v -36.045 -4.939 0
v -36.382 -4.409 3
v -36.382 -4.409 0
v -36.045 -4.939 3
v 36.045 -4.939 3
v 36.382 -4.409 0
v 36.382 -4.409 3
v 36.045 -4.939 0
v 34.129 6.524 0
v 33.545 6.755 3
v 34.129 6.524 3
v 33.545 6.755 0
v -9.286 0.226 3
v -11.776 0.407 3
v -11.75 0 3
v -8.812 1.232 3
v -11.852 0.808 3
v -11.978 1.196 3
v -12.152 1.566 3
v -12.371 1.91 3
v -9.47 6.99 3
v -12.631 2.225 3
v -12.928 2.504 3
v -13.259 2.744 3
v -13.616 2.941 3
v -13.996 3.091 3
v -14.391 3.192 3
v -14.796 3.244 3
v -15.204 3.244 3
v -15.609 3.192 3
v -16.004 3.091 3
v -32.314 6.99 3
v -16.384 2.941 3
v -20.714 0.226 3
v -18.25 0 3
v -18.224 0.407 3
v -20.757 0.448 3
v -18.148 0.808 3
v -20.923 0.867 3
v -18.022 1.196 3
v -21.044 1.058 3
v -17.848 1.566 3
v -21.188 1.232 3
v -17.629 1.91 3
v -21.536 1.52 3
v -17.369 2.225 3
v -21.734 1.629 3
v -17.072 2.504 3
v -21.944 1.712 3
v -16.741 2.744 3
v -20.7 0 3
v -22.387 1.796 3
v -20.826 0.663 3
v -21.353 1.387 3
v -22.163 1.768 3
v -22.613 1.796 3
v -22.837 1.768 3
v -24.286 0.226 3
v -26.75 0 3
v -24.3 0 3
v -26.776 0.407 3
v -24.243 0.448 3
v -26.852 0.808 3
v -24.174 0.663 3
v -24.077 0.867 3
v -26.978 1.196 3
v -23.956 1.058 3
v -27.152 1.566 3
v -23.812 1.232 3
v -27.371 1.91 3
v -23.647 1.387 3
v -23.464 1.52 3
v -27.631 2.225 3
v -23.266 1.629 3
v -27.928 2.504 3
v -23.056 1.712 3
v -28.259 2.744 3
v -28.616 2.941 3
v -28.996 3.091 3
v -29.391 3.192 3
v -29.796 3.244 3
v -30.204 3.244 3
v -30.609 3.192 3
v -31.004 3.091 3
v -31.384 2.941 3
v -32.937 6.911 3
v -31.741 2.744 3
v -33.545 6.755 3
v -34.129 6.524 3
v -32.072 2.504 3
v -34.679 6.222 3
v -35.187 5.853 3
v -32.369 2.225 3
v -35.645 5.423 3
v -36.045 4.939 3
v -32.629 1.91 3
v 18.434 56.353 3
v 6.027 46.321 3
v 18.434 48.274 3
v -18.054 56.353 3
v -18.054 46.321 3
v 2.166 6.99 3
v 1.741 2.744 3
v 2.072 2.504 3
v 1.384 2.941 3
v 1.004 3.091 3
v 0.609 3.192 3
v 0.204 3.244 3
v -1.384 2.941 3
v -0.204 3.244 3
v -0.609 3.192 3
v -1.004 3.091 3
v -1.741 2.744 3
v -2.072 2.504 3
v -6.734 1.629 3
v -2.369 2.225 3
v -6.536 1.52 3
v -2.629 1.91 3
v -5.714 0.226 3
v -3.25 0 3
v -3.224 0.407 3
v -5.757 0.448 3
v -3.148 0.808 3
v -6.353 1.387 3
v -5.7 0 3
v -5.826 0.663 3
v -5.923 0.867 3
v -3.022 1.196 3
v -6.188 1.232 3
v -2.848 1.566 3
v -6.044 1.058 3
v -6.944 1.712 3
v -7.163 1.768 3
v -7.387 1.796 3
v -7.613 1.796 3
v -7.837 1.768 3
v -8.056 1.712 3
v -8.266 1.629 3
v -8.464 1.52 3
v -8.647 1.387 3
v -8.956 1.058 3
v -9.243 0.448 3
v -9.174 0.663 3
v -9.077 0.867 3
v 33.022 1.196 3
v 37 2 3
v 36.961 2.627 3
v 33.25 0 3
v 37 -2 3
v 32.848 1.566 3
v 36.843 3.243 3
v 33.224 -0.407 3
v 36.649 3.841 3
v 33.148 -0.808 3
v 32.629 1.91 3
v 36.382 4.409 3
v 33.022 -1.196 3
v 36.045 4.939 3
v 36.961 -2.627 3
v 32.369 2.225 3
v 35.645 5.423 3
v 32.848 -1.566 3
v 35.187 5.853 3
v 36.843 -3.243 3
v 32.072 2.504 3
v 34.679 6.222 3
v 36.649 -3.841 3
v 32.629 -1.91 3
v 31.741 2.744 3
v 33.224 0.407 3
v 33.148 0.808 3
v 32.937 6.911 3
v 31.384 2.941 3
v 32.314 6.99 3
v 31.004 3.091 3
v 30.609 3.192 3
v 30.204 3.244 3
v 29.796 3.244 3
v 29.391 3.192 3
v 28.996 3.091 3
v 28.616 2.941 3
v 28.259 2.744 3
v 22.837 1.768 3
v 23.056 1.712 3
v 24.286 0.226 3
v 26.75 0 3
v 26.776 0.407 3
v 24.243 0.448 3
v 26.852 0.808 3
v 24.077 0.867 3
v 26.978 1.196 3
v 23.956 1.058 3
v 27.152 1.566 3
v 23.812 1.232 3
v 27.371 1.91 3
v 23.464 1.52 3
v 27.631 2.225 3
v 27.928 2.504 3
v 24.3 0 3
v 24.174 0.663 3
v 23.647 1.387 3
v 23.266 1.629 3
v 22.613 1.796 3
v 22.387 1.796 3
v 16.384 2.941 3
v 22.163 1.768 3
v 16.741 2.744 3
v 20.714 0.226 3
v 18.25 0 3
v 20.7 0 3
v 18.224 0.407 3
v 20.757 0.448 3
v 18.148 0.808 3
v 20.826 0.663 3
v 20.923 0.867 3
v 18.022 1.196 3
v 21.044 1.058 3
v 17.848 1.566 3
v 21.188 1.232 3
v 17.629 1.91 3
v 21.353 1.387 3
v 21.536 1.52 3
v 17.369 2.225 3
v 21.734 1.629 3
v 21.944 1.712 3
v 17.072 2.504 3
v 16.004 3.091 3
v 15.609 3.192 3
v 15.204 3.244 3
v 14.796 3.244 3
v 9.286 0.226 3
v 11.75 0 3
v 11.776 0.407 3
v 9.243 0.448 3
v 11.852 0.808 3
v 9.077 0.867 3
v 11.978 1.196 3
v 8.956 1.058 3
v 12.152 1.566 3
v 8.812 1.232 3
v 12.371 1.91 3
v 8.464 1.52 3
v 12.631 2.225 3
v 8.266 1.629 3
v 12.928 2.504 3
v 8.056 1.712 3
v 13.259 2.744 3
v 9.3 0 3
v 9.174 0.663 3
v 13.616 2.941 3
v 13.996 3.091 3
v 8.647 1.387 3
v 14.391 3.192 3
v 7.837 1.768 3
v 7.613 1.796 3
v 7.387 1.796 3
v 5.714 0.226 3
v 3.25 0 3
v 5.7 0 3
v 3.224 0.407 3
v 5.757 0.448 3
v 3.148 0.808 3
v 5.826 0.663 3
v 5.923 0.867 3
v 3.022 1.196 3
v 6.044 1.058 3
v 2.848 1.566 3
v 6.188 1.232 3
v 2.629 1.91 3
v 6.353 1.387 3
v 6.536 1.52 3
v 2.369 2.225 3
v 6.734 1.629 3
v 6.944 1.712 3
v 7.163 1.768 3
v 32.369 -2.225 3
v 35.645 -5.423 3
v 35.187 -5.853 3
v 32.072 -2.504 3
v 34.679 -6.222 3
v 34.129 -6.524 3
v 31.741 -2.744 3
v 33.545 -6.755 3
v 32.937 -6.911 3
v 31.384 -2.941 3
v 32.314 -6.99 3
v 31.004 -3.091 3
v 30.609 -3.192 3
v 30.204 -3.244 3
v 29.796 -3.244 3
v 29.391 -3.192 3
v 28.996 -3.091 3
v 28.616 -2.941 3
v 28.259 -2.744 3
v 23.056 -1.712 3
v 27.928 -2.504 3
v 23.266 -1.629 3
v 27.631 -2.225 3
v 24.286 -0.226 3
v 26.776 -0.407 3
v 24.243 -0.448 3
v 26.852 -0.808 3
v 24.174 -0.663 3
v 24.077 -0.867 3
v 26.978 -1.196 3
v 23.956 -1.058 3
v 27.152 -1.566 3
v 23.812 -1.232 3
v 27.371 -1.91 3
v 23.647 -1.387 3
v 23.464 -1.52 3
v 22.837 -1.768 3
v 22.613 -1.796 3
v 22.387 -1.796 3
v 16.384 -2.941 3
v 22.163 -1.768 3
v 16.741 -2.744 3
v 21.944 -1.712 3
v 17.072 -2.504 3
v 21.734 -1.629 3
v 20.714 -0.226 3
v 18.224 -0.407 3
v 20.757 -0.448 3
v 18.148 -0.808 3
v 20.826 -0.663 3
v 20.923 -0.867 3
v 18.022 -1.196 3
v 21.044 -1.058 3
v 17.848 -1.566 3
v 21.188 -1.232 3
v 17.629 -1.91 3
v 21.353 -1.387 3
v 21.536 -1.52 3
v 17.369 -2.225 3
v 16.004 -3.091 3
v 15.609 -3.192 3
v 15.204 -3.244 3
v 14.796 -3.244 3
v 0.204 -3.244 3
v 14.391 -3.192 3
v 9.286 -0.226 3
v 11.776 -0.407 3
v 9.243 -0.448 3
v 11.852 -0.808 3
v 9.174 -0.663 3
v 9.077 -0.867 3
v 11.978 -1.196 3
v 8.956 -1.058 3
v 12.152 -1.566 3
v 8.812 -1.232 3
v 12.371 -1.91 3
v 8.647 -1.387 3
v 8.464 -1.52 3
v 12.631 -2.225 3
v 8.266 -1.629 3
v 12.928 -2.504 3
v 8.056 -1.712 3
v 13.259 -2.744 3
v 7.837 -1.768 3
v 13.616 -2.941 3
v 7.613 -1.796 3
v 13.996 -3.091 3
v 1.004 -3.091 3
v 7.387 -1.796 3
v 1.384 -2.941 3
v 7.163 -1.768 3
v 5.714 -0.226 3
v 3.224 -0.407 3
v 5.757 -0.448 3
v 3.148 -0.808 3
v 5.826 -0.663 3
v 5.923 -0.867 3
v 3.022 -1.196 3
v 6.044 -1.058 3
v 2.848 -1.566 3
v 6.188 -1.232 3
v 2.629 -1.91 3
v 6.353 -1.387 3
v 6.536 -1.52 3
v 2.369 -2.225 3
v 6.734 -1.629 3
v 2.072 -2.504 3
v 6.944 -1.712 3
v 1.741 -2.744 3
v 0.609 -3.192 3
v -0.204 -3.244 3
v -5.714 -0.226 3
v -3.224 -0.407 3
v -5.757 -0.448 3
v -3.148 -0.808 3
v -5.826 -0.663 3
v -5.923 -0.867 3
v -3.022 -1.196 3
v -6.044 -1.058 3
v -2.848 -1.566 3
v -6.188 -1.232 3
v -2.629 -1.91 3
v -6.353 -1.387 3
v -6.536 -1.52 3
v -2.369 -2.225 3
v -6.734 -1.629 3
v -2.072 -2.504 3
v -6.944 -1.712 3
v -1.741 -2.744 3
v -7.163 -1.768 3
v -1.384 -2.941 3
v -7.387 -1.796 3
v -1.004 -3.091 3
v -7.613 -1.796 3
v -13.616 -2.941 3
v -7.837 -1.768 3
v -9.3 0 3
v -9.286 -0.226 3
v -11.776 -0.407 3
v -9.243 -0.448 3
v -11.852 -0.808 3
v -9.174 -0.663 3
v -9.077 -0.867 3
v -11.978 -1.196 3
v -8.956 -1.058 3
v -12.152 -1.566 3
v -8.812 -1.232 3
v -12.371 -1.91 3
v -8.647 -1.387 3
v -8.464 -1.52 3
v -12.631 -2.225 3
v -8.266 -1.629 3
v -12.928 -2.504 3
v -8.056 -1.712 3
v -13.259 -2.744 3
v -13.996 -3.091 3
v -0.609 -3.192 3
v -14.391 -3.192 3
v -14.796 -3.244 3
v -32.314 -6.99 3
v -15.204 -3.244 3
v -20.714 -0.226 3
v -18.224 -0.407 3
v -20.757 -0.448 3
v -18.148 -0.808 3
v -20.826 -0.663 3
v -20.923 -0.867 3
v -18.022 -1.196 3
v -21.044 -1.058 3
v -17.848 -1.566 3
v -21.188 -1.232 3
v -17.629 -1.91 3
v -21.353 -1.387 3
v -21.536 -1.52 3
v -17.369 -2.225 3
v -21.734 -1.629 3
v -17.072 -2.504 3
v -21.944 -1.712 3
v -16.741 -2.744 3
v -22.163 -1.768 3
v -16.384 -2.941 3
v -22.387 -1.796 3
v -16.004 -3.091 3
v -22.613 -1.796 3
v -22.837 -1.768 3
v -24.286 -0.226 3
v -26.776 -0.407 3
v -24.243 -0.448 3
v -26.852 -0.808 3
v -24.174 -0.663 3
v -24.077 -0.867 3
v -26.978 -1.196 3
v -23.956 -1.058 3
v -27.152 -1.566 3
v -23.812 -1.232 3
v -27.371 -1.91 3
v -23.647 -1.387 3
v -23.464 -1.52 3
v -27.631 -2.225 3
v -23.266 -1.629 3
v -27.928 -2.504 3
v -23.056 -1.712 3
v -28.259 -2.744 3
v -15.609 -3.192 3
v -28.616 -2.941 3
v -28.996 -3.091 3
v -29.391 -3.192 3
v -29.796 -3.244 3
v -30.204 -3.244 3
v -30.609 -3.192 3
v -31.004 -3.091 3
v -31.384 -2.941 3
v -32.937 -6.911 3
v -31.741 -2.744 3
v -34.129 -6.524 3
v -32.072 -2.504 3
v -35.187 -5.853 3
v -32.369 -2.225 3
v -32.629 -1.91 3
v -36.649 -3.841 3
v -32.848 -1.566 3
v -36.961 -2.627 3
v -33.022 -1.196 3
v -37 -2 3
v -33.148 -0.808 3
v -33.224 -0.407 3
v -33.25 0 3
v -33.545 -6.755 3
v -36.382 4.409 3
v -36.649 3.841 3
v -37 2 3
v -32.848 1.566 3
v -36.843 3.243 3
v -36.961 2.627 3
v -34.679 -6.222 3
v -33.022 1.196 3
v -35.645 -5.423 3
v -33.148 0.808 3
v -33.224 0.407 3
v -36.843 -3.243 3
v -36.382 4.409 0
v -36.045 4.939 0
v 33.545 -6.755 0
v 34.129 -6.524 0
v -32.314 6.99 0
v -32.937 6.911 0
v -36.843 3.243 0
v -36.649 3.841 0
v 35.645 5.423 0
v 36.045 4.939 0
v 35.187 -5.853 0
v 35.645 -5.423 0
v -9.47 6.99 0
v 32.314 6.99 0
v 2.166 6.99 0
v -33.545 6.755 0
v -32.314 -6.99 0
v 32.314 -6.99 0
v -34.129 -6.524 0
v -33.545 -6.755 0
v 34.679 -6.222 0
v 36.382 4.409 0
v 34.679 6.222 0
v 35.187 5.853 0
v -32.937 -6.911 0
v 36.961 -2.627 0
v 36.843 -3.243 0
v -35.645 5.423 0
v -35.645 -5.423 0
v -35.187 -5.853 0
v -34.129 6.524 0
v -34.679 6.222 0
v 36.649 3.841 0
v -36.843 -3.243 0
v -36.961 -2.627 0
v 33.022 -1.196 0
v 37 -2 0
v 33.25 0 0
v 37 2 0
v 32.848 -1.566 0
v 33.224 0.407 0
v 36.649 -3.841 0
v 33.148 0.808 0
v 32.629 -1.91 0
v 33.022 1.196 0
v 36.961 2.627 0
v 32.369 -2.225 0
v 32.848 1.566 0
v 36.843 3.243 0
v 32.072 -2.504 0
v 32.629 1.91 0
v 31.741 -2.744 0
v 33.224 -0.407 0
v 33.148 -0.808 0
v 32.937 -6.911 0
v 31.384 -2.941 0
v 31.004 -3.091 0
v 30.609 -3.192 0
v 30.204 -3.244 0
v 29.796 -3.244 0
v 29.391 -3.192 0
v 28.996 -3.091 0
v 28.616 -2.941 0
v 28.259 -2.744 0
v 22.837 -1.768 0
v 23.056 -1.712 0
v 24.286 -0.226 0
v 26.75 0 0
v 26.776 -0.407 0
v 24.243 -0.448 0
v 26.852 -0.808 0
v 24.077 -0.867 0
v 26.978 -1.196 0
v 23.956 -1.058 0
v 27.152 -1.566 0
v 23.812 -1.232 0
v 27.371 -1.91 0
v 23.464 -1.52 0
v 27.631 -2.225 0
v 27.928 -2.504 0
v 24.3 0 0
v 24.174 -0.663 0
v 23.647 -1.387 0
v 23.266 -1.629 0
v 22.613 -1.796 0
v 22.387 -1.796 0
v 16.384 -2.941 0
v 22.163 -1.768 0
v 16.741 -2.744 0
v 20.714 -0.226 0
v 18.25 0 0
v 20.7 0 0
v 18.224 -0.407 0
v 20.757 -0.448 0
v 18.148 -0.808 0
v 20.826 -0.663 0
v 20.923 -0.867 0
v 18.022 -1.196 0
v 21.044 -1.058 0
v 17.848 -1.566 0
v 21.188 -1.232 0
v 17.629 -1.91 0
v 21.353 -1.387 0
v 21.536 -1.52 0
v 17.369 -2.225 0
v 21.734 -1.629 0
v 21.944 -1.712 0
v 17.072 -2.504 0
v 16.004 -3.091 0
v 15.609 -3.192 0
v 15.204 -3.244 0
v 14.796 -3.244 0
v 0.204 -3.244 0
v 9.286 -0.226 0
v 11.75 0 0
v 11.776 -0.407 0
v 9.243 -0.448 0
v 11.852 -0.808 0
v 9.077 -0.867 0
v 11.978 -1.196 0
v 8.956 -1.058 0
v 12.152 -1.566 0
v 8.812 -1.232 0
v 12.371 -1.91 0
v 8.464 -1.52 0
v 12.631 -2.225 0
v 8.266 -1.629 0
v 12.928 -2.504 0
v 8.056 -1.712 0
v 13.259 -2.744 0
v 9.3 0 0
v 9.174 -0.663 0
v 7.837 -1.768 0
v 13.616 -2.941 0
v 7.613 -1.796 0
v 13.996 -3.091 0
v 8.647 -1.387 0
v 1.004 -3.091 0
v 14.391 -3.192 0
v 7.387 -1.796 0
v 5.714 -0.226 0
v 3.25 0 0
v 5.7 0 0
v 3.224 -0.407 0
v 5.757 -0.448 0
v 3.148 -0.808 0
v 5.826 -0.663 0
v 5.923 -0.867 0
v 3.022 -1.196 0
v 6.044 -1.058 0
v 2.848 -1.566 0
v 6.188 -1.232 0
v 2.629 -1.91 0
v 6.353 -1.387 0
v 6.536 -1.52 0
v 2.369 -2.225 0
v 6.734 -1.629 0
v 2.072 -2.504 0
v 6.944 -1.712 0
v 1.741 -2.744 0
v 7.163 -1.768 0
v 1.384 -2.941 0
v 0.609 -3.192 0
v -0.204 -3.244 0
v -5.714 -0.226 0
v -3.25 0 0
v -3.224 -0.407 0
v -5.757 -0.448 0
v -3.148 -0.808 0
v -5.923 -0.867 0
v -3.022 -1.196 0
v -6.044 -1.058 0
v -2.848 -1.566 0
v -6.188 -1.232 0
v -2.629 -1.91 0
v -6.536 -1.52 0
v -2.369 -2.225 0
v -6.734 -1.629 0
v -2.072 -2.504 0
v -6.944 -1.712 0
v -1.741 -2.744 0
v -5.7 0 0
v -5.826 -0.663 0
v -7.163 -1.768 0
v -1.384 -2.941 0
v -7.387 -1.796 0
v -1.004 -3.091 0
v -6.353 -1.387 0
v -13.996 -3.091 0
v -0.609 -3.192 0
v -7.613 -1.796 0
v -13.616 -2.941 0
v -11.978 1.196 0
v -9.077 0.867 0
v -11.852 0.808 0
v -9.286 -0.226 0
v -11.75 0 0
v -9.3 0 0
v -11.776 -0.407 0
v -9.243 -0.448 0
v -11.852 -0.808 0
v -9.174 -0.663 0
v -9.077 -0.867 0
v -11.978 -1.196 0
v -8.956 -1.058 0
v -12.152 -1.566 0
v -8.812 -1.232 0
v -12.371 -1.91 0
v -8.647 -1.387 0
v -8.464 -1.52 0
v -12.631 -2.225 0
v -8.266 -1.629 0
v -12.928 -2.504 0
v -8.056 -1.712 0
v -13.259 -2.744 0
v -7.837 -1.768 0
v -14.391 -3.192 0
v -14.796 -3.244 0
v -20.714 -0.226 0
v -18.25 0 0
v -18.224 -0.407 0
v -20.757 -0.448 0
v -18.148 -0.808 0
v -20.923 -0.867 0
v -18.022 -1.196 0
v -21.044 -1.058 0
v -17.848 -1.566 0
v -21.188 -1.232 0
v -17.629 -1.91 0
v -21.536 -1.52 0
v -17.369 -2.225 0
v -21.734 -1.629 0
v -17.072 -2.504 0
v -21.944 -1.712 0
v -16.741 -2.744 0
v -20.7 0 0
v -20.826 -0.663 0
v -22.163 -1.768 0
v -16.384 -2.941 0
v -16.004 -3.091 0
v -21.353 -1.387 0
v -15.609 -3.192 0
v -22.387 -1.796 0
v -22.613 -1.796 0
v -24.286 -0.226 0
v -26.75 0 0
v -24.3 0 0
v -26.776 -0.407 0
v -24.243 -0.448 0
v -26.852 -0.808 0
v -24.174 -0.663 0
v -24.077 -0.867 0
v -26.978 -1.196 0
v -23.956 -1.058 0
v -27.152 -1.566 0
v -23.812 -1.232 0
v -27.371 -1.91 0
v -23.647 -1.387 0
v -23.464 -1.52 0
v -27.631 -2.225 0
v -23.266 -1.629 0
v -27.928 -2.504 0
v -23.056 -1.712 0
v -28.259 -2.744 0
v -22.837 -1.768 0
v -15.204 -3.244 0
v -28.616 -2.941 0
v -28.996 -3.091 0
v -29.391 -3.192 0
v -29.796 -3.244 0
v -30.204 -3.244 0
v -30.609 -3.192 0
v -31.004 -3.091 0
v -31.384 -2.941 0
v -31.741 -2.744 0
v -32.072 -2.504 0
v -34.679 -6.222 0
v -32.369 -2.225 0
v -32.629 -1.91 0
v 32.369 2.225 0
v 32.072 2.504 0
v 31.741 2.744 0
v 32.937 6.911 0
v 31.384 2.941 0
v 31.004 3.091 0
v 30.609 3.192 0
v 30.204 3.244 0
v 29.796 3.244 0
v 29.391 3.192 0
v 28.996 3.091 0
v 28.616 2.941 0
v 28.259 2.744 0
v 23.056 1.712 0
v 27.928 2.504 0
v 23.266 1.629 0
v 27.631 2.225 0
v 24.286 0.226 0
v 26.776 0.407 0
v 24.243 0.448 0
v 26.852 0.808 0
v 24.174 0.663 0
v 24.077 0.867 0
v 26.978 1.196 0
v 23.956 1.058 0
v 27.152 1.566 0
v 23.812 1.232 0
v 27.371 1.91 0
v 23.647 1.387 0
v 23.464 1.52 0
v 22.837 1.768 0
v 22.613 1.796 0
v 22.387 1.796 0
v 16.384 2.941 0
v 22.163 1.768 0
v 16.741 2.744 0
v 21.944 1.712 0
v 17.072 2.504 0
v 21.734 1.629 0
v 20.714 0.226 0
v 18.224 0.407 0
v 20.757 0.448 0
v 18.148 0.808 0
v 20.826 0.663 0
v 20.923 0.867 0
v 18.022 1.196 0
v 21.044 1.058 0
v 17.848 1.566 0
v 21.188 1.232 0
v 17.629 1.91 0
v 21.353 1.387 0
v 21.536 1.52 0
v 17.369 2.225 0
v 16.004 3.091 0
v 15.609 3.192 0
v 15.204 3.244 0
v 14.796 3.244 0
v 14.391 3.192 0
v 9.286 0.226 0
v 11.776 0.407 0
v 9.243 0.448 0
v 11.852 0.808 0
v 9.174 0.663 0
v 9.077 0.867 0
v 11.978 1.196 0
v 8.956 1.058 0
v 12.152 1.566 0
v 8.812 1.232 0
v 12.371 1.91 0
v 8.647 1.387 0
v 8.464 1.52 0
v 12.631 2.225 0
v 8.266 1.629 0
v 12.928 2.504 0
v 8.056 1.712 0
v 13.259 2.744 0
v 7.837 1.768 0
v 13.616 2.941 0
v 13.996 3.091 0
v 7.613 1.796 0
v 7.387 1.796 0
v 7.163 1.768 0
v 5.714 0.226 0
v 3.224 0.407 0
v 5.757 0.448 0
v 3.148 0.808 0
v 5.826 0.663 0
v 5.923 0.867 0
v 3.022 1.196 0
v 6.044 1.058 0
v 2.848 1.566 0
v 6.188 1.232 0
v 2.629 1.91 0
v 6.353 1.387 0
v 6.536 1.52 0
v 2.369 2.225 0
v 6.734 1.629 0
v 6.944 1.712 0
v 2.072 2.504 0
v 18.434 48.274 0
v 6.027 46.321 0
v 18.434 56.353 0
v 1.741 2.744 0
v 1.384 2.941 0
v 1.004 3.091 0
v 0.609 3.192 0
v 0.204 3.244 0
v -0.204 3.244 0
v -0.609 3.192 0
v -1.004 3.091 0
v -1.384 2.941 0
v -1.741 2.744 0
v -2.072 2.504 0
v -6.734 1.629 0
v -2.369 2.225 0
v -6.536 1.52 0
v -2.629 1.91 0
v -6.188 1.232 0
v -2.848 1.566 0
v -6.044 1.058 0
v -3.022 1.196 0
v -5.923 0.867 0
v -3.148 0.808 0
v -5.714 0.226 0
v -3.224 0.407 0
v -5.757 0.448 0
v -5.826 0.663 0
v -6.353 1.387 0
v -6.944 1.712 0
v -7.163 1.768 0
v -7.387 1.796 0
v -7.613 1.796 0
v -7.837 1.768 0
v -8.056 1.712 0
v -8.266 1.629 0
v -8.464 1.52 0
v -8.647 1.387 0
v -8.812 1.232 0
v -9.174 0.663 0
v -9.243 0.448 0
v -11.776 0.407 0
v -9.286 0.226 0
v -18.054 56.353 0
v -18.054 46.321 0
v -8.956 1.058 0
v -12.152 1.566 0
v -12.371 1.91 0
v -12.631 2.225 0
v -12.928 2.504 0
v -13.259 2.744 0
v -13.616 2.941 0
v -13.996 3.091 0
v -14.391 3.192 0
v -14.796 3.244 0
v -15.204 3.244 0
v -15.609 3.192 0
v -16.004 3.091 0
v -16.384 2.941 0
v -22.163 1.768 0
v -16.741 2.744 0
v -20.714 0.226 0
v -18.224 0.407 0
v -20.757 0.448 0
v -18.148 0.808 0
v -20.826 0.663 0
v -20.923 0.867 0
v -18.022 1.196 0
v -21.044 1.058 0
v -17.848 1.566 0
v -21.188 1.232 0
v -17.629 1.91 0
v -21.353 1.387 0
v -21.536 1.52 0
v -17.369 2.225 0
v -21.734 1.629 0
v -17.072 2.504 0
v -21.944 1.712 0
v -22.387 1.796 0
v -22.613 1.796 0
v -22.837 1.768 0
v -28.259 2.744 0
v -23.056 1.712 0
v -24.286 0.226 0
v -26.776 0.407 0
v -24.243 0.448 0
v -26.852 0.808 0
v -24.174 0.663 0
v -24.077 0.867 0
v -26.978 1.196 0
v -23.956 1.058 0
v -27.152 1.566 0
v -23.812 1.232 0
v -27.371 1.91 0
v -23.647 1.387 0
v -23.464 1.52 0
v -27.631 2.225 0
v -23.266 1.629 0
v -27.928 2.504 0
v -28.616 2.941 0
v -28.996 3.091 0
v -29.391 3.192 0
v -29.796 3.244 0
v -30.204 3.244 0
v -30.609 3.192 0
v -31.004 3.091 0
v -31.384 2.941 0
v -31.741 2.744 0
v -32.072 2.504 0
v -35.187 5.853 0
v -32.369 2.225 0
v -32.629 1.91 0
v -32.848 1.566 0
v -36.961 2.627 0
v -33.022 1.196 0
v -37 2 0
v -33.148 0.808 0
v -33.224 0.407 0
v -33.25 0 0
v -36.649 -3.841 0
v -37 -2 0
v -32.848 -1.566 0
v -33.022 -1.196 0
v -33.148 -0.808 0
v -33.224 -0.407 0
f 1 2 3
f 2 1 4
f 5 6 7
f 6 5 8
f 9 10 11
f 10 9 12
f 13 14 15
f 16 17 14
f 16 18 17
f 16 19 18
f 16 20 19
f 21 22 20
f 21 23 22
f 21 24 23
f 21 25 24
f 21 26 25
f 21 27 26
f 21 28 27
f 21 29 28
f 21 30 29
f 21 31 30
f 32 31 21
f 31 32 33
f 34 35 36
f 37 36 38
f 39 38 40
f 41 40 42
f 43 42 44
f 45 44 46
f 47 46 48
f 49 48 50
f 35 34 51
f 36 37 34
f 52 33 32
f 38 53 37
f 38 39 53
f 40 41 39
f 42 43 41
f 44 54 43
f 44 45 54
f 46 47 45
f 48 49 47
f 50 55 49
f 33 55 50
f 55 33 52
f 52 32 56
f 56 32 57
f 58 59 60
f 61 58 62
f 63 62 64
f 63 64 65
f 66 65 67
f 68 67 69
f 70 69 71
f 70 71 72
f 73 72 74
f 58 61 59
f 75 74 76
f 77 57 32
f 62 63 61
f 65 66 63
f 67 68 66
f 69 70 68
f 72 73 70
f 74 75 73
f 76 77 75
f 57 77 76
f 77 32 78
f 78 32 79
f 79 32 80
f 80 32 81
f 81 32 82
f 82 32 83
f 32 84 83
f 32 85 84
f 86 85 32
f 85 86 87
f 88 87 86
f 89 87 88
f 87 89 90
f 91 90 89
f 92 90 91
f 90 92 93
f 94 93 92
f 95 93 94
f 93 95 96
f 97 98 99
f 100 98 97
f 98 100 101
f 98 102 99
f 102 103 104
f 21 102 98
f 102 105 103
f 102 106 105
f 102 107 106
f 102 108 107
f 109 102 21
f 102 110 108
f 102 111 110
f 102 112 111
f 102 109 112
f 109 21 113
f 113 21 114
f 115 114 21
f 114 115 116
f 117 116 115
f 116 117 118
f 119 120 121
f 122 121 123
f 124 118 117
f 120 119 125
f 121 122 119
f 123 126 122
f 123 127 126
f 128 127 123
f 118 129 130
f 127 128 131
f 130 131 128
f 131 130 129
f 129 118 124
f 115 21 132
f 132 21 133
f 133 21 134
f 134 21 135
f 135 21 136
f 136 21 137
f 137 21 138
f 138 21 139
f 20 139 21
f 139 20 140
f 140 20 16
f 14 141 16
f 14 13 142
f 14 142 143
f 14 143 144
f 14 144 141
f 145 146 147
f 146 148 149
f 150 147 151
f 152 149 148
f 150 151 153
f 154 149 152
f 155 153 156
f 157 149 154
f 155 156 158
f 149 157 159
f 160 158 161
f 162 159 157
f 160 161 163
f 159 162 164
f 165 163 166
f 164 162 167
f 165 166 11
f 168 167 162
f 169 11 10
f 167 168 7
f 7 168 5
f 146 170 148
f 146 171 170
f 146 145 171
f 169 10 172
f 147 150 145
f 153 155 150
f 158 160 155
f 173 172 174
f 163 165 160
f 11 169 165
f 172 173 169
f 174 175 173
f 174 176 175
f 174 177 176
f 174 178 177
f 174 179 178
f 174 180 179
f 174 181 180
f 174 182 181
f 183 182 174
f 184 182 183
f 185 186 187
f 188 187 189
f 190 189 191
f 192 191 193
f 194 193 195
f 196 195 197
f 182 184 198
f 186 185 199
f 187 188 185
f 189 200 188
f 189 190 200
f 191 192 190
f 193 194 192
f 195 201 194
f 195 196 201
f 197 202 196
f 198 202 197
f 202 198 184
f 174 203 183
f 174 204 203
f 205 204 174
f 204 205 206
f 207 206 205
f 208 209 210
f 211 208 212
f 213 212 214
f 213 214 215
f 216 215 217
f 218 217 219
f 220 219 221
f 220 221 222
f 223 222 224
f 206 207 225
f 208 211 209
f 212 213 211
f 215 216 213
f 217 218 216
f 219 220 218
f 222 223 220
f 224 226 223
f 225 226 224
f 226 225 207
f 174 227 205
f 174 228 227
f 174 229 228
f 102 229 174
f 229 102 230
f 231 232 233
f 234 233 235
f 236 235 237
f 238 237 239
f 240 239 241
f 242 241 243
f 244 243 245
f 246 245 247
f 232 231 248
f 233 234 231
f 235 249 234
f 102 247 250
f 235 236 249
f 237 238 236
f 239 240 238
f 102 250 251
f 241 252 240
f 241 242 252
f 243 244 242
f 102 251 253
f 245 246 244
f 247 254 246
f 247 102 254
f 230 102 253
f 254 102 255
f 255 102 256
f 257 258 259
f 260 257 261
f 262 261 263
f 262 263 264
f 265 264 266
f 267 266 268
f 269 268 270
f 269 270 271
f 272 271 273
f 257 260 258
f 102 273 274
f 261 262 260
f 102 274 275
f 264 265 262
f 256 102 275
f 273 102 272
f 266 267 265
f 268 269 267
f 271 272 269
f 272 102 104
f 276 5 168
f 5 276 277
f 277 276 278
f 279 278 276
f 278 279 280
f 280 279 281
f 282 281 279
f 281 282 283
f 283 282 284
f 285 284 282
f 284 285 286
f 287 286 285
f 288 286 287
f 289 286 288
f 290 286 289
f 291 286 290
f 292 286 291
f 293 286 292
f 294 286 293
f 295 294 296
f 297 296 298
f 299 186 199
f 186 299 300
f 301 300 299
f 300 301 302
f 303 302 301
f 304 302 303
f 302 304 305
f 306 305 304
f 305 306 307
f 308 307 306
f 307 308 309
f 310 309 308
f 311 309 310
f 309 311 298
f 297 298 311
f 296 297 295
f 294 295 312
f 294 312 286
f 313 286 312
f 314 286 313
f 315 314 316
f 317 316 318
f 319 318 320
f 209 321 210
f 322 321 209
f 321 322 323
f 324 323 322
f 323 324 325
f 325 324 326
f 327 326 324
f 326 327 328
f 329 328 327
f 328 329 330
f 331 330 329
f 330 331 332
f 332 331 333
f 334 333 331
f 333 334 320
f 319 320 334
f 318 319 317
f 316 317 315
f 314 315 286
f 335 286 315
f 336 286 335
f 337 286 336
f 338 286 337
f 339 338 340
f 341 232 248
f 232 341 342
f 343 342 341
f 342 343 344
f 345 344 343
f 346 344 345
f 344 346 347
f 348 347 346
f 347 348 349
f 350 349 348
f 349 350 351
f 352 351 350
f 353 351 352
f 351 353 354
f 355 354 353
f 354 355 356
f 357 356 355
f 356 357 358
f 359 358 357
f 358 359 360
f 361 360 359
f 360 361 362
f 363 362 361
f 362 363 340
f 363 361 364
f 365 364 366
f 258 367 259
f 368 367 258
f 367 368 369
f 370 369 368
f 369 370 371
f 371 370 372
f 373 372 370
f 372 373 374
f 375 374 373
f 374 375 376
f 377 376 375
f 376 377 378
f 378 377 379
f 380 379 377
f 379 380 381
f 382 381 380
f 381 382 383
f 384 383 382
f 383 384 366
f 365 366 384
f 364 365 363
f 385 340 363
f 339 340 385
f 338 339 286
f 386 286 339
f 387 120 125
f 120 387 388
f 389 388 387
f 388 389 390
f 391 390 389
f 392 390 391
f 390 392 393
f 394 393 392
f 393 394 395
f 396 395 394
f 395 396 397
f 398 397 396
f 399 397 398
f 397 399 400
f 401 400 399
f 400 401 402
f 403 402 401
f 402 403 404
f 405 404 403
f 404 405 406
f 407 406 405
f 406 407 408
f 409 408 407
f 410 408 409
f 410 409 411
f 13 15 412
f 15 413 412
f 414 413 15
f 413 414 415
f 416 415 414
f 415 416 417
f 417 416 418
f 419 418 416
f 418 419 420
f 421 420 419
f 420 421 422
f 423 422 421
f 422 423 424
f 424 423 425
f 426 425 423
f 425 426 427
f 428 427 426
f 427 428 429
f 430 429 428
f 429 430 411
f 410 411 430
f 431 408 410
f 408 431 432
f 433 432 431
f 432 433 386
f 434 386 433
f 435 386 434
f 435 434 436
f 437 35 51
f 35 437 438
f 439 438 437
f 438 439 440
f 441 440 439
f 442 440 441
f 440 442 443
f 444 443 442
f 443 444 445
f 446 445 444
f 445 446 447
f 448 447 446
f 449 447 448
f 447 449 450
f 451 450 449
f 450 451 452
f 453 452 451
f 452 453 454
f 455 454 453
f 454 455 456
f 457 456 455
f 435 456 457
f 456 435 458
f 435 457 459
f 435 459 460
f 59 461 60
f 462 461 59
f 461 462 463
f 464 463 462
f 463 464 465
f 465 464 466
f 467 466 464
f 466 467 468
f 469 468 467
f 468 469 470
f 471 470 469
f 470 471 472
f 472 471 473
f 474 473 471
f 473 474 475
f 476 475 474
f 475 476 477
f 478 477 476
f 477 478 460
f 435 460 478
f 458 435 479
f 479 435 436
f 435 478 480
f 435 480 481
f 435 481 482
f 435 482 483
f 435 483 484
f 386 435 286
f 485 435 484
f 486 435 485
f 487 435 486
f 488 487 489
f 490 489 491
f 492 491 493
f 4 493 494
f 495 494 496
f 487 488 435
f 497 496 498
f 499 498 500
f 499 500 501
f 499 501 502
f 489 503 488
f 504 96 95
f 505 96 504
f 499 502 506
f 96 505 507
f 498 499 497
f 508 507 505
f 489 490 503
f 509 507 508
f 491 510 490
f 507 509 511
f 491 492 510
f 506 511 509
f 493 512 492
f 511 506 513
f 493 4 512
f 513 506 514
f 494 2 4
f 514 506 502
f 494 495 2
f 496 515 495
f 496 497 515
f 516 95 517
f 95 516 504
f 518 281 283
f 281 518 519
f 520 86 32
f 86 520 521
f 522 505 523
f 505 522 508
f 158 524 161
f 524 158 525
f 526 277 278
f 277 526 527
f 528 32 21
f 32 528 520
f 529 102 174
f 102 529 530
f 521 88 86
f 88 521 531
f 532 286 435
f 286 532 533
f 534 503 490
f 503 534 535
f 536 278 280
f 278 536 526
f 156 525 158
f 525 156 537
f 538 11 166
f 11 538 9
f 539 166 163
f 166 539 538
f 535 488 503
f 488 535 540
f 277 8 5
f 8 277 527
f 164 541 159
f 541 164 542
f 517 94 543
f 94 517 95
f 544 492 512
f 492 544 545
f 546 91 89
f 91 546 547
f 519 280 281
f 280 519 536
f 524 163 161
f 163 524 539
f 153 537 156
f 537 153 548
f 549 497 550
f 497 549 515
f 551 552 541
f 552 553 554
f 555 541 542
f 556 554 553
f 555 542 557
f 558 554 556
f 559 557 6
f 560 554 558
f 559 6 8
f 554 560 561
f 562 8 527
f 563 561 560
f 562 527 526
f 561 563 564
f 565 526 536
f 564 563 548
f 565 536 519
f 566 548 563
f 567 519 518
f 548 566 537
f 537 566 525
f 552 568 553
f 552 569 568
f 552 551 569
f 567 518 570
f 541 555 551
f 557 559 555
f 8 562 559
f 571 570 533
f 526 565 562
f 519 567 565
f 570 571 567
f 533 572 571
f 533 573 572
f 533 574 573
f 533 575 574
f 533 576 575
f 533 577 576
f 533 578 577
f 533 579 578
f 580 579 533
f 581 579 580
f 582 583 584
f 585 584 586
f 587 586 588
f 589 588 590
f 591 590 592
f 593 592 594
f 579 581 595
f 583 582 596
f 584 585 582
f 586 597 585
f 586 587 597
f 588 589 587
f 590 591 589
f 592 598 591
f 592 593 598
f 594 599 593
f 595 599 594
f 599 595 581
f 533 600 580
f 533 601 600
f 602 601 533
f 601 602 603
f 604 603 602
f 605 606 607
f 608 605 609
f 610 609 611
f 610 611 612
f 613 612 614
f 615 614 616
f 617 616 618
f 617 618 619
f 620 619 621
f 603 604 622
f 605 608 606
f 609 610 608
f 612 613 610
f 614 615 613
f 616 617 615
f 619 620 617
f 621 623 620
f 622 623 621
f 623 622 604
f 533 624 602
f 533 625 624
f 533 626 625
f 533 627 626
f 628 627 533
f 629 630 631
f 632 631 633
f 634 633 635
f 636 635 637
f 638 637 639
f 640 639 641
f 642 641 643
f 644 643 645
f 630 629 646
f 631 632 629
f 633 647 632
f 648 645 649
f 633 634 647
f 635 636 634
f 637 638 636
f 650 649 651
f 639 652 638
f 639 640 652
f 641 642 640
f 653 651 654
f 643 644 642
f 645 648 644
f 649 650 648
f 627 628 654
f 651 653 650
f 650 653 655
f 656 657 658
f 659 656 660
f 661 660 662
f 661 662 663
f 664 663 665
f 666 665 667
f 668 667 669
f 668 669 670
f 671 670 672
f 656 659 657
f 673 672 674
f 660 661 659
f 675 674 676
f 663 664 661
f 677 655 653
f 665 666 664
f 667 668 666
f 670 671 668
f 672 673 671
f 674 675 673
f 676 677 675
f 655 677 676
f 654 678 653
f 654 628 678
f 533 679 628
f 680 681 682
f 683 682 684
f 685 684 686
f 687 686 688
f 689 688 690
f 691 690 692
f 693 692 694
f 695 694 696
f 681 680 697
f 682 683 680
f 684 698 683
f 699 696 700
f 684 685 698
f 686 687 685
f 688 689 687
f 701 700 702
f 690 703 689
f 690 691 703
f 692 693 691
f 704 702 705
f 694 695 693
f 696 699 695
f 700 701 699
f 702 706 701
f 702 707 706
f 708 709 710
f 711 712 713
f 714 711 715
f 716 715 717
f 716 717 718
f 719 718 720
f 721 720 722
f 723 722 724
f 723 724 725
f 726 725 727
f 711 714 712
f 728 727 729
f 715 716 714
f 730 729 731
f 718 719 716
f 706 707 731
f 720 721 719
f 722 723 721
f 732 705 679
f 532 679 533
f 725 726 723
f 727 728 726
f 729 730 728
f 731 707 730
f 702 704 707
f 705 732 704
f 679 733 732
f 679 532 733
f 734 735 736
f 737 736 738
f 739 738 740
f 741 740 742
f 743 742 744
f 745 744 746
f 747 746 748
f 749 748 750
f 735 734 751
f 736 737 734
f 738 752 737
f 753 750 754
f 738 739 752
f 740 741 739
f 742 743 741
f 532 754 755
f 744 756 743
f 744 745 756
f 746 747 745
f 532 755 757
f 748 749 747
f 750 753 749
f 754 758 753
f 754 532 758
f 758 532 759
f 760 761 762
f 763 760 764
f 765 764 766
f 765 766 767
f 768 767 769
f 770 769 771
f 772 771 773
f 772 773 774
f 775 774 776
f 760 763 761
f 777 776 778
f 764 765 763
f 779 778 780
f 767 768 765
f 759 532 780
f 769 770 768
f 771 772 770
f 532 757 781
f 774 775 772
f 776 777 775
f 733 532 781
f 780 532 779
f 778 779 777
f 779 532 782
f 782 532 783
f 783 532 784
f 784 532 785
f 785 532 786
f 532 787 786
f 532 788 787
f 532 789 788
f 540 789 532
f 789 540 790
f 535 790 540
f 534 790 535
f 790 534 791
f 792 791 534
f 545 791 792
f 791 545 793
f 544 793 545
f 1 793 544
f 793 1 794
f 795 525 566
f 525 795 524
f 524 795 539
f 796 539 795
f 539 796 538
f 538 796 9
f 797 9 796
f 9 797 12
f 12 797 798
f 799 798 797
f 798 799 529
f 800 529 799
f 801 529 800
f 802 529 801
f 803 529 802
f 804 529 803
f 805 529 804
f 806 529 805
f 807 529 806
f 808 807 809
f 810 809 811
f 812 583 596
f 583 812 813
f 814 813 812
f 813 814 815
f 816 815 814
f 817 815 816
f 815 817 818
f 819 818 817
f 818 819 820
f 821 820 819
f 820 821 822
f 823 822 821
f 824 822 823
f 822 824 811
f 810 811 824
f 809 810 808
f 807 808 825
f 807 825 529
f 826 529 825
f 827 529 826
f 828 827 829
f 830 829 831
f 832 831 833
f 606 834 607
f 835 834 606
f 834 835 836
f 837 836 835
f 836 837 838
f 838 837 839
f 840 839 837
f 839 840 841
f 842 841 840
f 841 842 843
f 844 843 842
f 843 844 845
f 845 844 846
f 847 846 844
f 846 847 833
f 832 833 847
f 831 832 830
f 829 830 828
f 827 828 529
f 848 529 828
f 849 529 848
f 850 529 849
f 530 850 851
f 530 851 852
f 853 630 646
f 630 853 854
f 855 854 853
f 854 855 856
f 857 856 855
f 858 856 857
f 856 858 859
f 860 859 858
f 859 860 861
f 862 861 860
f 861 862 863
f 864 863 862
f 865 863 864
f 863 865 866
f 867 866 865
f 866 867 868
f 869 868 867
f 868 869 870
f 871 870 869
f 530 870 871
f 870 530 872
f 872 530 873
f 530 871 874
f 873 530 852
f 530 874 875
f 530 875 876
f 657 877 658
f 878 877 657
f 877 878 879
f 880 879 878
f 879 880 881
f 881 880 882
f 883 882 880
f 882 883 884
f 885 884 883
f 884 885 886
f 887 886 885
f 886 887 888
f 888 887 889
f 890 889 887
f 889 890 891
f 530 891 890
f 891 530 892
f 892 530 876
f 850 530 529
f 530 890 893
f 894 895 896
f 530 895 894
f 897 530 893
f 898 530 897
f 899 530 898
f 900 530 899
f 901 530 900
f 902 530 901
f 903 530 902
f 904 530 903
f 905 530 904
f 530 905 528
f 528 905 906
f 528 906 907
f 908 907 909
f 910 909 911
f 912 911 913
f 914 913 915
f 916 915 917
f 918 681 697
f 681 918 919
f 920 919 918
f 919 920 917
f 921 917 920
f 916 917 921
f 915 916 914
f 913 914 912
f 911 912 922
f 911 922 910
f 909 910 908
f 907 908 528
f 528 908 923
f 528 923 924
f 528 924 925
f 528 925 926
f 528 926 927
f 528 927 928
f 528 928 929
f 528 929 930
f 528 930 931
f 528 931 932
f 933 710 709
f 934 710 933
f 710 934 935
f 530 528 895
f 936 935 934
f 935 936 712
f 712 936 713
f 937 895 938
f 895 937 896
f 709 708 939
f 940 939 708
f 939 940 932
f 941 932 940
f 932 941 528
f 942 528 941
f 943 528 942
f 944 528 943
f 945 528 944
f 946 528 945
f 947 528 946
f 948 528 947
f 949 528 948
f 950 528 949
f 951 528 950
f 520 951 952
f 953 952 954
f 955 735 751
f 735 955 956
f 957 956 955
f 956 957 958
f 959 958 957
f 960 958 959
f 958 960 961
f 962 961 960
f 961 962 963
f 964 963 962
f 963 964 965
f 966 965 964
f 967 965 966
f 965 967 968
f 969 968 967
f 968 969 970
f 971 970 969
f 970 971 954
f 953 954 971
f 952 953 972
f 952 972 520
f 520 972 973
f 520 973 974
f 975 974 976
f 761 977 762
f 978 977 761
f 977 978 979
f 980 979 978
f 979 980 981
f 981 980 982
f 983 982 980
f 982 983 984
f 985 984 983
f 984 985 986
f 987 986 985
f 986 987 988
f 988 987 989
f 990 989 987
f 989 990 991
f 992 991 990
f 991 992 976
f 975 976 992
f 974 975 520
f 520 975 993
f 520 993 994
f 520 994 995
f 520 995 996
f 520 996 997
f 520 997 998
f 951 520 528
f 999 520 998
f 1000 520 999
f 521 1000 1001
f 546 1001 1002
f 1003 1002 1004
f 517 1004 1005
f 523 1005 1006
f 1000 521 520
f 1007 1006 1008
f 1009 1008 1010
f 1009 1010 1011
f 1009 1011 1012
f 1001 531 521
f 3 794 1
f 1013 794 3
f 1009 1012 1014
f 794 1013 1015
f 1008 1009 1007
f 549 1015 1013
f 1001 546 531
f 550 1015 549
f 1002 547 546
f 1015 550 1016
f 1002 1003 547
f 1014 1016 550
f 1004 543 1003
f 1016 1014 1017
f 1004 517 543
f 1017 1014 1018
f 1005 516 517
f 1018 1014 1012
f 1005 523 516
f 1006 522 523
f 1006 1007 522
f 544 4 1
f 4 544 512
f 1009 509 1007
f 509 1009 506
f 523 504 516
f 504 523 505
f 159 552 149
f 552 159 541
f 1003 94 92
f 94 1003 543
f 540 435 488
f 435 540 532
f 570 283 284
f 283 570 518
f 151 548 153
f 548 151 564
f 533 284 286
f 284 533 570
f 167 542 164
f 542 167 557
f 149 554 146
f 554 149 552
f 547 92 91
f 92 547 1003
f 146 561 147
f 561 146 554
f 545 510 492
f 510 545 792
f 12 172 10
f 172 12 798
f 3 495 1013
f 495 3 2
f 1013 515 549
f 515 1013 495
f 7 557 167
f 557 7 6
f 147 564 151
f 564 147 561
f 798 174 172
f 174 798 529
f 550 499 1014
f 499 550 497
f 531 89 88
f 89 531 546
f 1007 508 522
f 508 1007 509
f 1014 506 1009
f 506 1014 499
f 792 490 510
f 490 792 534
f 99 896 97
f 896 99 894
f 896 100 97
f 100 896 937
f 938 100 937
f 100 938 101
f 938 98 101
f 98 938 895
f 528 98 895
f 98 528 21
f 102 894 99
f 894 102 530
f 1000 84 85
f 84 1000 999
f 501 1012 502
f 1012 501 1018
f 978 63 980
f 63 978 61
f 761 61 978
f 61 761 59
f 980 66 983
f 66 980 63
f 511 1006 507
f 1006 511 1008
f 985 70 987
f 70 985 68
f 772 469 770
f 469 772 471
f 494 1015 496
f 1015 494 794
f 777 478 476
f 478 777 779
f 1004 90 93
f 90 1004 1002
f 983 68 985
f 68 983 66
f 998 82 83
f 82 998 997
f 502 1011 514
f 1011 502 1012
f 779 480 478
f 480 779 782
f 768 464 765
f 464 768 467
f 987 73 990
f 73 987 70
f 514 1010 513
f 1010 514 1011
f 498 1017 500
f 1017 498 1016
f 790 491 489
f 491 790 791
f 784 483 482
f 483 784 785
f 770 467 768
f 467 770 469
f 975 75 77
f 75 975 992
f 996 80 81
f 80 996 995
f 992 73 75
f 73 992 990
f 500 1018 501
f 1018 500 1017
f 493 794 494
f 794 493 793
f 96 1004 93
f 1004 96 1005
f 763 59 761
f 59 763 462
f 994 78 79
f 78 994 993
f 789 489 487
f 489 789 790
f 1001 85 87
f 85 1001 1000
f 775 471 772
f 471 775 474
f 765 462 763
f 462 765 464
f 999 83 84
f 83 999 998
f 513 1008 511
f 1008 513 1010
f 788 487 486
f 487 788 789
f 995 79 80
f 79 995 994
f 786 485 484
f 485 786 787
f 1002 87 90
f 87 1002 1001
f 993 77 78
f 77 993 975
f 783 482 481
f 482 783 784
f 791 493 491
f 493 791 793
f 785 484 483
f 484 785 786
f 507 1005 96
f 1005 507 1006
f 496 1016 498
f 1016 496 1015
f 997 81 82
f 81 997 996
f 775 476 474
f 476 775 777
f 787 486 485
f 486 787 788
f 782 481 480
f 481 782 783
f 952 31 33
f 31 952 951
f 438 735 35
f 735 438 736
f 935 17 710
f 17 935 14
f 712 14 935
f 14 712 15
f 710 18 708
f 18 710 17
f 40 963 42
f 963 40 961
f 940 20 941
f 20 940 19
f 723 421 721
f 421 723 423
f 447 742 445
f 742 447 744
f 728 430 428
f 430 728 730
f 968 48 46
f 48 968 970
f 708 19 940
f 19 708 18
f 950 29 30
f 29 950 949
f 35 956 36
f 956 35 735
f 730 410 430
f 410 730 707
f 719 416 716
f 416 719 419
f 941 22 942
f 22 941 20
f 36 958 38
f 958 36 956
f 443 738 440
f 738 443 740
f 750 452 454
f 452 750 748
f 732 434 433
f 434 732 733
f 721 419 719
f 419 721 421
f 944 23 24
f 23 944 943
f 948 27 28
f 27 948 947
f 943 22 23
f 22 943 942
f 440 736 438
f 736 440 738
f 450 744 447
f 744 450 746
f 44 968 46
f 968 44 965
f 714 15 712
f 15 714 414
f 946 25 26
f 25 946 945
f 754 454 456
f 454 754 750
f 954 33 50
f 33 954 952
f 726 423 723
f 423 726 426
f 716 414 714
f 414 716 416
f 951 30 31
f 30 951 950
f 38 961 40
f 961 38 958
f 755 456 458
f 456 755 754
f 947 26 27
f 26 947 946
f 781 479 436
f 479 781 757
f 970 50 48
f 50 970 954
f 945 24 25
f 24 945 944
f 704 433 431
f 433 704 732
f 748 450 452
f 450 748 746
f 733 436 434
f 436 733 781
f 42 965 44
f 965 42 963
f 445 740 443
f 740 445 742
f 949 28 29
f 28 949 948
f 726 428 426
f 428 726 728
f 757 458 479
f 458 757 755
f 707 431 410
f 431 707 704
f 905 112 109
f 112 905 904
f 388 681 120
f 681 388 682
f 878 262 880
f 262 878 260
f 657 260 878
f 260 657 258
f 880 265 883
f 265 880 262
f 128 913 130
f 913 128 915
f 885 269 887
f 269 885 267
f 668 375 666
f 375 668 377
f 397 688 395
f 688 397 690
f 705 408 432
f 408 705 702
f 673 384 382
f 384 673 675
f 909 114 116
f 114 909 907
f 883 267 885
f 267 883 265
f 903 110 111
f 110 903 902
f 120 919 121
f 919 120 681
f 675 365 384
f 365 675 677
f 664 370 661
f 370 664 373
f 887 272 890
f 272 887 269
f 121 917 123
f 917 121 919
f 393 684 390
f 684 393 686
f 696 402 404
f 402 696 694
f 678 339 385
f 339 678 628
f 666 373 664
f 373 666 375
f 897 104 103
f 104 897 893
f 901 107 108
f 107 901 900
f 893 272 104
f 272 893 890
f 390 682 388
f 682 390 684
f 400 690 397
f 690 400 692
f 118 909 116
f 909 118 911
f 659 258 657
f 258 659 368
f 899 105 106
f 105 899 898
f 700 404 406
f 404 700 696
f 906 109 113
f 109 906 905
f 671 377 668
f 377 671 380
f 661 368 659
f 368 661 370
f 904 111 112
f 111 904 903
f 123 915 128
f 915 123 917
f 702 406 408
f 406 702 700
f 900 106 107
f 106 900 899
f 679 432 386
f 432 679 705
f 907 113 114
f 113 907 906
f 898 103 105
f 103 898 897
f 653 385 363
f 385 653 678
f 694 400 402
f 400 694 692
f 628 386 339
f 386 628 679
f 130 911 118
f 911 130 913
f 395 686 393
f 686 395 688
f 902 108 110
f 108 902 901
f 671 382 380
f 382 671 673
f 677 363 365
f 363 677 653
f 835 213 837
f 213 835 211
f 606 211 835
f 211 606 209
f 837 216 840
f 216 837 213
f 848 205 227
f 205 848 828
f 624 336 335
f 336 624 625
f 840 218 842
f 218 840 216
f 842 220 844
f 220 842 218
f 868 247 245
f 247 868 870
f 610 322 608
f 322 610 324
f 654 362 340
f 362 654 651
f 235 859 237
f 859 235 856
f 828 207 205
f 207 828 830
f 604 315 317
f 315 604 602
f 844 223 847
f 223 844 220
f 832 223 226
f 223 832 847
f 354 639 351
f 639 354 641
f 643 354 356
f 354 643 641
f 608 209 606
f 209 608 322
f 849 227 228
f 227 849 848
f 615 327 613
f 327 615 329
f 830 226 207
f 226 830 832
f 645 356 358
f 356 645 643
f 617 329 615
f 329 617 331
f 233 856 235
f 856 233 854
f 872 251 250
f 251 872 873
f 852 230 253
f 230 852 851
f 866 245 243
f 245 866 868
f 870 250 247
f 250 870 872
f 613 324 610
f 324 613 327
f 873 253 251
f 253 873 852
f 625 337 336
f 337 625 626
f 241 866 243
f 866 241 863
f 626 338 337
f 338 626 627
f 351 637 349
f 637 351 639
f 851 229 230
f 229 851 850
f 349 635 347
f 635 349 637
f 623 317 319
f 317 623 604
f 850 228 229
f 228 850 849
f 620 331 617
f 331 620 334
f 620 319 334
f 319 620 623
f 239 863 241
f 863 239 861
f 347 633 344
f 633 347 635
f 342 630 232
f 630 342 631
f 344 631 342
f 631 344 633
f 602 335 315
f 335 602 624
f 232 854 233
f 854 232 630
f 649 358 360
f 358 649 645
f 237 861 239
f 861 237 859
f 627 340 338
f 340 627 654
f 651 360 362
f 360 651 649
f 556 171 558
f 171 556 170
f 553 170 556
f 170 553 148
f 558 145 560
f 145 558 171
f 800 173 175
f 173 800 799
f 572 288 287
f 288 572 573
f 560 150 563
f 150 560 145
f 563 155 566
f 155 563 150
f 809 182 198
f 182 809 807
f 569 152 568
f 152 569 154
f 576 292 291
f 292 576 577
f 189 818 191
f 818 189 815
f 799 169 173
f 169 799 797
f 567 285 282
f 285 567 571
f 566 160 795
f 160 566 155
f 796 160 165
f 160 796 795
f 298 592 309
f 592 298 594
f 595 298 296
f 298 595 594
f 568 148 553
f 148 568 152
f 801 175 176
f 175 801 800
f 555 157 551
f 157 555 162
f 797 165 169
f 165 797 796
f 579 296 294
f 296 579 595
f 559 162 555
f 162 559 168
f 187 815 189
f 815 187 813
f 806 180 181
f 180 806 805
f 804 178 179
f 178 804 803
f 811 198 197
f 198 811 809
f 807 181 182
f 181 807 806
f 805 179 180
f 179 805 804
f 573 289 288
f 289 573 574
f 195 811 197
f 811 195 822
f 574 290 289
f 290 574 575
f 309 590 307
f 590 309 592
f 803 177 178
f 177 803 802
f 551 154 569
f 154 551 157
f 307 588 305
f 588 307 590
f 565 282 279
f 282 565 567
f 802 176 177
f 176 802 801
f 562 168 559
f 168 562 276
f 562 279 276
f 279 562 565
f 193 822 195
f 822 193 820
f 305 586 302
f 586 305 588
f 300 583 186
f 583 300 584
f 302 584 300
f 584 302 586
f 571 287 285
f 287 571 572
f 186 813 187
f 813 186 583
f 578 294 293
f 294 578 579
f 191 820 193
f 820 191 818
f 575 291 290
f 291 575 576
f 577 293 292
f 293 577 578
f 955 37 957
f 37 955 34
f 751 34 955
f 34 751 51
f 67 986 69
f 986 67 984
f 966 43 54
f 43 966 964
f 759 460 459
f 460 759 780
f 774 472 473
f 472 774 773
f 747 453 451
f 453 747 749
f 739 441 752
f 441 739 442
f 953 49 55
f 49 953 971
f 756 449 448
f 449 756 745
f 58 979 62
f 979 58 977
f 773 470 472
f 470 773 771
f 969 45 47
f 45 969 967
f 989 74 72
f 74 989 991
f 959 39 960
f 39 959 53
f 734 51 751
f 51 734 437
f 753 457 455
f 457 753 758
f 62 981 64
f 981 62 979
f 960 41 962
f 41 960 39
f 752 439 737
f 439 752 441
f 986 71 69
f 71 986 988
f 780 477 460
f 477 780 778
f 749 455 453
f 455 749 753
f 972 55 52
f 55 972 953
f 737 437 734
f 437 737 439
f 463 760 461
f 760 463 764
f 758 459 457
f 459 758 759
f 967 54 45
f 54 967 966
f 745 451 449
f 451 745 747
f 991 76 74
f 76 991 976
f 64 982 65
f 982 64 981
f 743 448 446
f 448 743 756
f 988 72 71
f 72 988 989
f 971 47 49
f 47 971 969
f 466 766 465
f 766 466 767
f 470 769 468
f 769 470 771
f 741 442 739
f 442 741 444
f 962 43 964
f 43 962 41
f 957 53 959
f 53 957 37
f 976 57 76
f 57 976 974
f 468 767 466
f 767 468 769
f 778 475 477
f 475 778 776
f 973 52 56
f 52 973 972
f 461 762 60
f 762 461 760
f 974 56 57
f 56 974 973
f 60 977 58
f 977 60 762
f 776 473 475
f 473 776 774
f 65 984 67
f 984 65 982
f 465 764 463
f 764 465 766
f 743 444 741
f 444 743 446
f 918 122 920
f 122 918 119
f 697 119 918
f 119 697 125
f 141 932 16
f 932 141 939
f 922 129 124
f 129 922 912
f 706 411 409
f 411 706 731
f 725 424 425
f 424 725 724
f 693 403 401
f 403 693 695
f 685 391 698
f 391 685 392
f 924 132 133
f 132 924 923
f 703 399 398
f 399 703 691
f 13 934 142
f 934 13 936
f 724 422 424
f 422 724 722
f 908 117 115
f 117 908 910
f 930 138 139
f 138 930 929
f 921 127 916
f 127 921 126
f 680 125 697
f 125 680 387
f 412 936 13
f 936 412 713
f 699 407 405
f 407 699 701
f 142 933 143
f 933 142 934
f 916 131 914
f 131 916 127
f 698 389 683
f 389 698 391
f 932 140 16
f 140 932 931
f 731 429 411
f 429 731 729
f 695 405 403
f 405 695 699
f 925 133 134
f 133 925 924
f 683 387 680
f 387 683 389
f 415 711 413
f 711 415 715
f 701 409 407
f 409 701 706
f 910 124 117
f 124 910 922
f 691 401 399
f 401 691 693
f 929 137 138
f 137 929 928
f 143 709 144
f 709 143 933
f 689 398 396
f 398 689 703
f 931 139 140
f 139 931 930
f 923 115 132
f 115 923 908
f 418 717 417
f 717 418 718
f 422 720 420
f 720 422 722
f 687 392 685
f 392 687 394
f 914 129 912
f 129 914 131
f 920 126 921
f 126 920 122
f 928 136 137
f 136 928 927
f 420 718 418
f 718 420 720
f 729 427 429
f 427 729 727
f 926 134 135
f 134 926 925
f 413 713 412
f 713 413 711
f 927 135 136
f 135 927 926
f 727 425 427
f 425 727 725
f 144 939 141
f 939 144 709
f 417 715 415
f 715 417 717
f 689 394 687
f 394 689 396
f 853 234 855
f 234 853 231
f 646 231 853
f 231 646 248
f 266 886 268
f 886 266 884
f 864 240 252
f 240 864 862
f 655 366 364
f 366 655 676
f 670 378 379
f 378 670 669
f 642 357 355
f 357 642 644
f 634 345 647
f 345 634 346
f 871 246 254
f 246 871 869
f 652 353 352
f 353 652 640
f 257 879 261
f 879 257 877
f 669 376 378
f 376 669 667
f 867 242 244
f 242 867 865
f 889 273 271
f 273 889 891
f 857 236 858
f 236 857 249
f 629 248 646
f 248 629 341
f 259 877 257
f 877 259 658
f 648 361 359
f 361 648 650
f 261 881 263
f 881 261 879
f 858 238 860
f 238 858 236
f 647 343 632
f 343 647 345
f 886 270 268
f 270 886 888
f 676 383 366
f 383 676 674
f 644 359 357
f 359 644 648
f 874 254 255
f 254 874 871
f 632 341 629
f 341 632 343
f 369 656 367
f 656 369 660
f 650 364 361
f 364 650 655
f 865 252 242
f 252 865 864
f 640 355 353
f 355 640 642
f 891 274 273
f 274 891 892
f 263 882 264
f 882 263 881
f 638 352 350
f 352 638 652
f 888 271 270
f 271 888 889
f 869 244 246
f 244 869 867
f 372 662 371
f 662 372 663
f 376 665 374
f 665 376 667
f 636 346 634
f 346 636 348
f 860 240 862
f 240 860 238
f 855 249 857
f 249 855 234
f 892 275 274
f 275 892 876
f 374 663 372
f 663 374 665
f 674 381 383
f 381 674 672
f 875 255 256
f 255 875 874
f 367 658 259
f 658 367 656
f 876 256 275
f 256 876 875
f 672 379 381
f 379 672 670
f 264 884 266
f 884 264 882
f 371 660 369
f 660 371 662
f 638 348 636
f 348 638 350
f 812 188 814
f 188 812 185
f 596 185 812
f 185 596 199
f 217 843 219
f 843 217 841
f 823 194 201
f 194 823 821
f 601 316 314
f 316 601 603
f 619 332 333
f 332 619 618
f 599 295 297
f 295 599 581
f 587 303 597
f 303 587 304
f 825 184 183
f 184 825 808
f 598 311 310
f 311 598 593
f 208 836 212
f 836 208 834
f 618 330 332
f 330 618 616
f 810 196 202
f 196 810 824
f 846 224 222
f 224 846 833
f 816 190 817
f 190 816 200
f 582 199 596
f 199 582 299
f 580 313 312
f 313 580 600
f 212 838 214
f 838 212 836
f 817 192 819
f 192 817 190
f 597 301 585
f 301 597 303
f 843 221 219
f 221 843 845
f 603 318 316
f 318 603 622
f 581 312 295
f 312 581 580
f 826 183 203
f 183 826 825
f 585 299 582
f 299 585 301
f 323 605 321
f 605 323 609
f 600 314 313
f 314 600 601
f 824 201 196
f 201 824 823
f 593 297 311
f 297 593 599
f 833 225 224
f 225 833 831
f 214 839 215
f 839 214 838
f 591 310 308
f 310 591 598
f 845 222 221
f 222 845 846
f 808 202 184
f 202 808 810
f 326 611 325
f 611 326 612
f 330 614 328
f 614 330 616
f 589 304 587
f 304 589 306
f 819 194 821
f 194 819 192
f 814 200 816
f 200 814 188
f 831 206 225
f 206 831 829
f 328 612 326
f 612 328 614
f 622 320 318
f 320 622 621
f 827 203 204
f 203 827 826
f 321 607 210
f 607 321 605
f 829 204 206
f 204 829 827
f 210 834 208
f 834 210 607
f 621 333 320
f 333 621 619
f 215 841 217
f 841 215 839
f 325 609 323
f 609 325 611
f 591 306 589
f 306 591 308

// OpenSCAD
$fn = 50;


difference() {
	union() {
		hull() {
			translate(v = [-32.0000000000, 2.0000000000, 0]) {
				cylinder(h = 3, r = 5);
			}
			translate(v = [32.0000000000, 2.0000000000, 0]) {
				cylinder(h = 3, r = 5);
			}
			translate(v = [-32.0000000000, -2.0000000000, 0]) {
				cylinder(h = 3, r = 5);
			}
			translate(v = [32.0000000000, -2.0000000000, 0]) {
				cylinder(h = 3, r = 5);
			}
		}
		translate(v = [0, 55, 0]) {
			linear_extrude(height = 3) {
				text(font = "DejaVu Sans Mono:style=Bold", halign = "center", size = 57.0000000000, text = "7", valign = "top");
			}
		}
	}
	union() {
		translate(v = [-30.0000000000, 0.0000000000, 0]) {
			translate(v = [0, 0, -100]) {
				cylinder(h = 200, r = 3.2500000000);
			}
		}
		translate(v = [-15.0000000000, 0.0000000000, 0]) {
			translate(v = [0, 0, -100]) {
				cylinder(h = 200, r = 3.2500000000);
			}
		}
		translate(v = [0, 0, -100]) {
			cylinder(h = 200, r = 3.2500000000);
		}
		translate(v = [15.0000000000, 0.0000000000, 0]) {
			translate(v = [0, 0, -100]) {
				cylinder(h = 200, r = 3.2500000000);
			}
		}
		translate(v = [30.0000000000, 0.0000000000, 0]) {
			translate(v = [0, 0, -100]) {
				cylinder(h = 200, r = 3.2500000000);
			}
		}
		translate(v = [-30.0000000000, 0.0000000000, 0]) {
			translate(v = [0, 0, -100]) {
				cylinder(h = 200, r = 1.8000000000);
			}
		}
		translate(v = [-22.5000000000, 0.0000000000, 0]) {
			translate(v = [0, 0, -100]) {
				cylinder(h = 200, r = 1.8000000000);
			}
		}
		translate(v = [-15.0000000000, 0.0000000000, 0]) {
			translate(v = [0, 0, -100]) {
				cylinder(h = 200, r = 1.8000000000);
			}
		}
		translate(v = [-7.5000000000, 0.0000000000, 0]) {
			translate(v = [0, 0, -100]) {
				cylinder(h = 200, r = 1.8000000000);
			}
		}
		translate(v = [0, 0, -100]) {
			cylinder(h = 200, r = 1.8000000000);
		}
		translate(v = [7.5000000000, 0.0000000000, 0]) {
			translate(v = [0, 0, -100]) {
				cylinder(h = 200, r = 1.8000000000);
			}
		}
		translate(v = [15.0000000000, 0.0000000000, 0]) {
			translate(v = [0, 0, -100]) {
				cylinder(h = 200, r = 1.8000000000);
			}
		}
		translate(v = [22.5000000000, 0.0000000000, 0]) {
			translate(v = [0, 0, -100]) {
				cylinder(h = 200, r = 1.8000000000);
			}
		}
		translate(v = [30.0000000000, 0.0000000000, 0]) {
			translate(v = [0, 0, -100]) {
				cylinder(h = 200, r = 1.8000000000);
			}
		}
	}
}
